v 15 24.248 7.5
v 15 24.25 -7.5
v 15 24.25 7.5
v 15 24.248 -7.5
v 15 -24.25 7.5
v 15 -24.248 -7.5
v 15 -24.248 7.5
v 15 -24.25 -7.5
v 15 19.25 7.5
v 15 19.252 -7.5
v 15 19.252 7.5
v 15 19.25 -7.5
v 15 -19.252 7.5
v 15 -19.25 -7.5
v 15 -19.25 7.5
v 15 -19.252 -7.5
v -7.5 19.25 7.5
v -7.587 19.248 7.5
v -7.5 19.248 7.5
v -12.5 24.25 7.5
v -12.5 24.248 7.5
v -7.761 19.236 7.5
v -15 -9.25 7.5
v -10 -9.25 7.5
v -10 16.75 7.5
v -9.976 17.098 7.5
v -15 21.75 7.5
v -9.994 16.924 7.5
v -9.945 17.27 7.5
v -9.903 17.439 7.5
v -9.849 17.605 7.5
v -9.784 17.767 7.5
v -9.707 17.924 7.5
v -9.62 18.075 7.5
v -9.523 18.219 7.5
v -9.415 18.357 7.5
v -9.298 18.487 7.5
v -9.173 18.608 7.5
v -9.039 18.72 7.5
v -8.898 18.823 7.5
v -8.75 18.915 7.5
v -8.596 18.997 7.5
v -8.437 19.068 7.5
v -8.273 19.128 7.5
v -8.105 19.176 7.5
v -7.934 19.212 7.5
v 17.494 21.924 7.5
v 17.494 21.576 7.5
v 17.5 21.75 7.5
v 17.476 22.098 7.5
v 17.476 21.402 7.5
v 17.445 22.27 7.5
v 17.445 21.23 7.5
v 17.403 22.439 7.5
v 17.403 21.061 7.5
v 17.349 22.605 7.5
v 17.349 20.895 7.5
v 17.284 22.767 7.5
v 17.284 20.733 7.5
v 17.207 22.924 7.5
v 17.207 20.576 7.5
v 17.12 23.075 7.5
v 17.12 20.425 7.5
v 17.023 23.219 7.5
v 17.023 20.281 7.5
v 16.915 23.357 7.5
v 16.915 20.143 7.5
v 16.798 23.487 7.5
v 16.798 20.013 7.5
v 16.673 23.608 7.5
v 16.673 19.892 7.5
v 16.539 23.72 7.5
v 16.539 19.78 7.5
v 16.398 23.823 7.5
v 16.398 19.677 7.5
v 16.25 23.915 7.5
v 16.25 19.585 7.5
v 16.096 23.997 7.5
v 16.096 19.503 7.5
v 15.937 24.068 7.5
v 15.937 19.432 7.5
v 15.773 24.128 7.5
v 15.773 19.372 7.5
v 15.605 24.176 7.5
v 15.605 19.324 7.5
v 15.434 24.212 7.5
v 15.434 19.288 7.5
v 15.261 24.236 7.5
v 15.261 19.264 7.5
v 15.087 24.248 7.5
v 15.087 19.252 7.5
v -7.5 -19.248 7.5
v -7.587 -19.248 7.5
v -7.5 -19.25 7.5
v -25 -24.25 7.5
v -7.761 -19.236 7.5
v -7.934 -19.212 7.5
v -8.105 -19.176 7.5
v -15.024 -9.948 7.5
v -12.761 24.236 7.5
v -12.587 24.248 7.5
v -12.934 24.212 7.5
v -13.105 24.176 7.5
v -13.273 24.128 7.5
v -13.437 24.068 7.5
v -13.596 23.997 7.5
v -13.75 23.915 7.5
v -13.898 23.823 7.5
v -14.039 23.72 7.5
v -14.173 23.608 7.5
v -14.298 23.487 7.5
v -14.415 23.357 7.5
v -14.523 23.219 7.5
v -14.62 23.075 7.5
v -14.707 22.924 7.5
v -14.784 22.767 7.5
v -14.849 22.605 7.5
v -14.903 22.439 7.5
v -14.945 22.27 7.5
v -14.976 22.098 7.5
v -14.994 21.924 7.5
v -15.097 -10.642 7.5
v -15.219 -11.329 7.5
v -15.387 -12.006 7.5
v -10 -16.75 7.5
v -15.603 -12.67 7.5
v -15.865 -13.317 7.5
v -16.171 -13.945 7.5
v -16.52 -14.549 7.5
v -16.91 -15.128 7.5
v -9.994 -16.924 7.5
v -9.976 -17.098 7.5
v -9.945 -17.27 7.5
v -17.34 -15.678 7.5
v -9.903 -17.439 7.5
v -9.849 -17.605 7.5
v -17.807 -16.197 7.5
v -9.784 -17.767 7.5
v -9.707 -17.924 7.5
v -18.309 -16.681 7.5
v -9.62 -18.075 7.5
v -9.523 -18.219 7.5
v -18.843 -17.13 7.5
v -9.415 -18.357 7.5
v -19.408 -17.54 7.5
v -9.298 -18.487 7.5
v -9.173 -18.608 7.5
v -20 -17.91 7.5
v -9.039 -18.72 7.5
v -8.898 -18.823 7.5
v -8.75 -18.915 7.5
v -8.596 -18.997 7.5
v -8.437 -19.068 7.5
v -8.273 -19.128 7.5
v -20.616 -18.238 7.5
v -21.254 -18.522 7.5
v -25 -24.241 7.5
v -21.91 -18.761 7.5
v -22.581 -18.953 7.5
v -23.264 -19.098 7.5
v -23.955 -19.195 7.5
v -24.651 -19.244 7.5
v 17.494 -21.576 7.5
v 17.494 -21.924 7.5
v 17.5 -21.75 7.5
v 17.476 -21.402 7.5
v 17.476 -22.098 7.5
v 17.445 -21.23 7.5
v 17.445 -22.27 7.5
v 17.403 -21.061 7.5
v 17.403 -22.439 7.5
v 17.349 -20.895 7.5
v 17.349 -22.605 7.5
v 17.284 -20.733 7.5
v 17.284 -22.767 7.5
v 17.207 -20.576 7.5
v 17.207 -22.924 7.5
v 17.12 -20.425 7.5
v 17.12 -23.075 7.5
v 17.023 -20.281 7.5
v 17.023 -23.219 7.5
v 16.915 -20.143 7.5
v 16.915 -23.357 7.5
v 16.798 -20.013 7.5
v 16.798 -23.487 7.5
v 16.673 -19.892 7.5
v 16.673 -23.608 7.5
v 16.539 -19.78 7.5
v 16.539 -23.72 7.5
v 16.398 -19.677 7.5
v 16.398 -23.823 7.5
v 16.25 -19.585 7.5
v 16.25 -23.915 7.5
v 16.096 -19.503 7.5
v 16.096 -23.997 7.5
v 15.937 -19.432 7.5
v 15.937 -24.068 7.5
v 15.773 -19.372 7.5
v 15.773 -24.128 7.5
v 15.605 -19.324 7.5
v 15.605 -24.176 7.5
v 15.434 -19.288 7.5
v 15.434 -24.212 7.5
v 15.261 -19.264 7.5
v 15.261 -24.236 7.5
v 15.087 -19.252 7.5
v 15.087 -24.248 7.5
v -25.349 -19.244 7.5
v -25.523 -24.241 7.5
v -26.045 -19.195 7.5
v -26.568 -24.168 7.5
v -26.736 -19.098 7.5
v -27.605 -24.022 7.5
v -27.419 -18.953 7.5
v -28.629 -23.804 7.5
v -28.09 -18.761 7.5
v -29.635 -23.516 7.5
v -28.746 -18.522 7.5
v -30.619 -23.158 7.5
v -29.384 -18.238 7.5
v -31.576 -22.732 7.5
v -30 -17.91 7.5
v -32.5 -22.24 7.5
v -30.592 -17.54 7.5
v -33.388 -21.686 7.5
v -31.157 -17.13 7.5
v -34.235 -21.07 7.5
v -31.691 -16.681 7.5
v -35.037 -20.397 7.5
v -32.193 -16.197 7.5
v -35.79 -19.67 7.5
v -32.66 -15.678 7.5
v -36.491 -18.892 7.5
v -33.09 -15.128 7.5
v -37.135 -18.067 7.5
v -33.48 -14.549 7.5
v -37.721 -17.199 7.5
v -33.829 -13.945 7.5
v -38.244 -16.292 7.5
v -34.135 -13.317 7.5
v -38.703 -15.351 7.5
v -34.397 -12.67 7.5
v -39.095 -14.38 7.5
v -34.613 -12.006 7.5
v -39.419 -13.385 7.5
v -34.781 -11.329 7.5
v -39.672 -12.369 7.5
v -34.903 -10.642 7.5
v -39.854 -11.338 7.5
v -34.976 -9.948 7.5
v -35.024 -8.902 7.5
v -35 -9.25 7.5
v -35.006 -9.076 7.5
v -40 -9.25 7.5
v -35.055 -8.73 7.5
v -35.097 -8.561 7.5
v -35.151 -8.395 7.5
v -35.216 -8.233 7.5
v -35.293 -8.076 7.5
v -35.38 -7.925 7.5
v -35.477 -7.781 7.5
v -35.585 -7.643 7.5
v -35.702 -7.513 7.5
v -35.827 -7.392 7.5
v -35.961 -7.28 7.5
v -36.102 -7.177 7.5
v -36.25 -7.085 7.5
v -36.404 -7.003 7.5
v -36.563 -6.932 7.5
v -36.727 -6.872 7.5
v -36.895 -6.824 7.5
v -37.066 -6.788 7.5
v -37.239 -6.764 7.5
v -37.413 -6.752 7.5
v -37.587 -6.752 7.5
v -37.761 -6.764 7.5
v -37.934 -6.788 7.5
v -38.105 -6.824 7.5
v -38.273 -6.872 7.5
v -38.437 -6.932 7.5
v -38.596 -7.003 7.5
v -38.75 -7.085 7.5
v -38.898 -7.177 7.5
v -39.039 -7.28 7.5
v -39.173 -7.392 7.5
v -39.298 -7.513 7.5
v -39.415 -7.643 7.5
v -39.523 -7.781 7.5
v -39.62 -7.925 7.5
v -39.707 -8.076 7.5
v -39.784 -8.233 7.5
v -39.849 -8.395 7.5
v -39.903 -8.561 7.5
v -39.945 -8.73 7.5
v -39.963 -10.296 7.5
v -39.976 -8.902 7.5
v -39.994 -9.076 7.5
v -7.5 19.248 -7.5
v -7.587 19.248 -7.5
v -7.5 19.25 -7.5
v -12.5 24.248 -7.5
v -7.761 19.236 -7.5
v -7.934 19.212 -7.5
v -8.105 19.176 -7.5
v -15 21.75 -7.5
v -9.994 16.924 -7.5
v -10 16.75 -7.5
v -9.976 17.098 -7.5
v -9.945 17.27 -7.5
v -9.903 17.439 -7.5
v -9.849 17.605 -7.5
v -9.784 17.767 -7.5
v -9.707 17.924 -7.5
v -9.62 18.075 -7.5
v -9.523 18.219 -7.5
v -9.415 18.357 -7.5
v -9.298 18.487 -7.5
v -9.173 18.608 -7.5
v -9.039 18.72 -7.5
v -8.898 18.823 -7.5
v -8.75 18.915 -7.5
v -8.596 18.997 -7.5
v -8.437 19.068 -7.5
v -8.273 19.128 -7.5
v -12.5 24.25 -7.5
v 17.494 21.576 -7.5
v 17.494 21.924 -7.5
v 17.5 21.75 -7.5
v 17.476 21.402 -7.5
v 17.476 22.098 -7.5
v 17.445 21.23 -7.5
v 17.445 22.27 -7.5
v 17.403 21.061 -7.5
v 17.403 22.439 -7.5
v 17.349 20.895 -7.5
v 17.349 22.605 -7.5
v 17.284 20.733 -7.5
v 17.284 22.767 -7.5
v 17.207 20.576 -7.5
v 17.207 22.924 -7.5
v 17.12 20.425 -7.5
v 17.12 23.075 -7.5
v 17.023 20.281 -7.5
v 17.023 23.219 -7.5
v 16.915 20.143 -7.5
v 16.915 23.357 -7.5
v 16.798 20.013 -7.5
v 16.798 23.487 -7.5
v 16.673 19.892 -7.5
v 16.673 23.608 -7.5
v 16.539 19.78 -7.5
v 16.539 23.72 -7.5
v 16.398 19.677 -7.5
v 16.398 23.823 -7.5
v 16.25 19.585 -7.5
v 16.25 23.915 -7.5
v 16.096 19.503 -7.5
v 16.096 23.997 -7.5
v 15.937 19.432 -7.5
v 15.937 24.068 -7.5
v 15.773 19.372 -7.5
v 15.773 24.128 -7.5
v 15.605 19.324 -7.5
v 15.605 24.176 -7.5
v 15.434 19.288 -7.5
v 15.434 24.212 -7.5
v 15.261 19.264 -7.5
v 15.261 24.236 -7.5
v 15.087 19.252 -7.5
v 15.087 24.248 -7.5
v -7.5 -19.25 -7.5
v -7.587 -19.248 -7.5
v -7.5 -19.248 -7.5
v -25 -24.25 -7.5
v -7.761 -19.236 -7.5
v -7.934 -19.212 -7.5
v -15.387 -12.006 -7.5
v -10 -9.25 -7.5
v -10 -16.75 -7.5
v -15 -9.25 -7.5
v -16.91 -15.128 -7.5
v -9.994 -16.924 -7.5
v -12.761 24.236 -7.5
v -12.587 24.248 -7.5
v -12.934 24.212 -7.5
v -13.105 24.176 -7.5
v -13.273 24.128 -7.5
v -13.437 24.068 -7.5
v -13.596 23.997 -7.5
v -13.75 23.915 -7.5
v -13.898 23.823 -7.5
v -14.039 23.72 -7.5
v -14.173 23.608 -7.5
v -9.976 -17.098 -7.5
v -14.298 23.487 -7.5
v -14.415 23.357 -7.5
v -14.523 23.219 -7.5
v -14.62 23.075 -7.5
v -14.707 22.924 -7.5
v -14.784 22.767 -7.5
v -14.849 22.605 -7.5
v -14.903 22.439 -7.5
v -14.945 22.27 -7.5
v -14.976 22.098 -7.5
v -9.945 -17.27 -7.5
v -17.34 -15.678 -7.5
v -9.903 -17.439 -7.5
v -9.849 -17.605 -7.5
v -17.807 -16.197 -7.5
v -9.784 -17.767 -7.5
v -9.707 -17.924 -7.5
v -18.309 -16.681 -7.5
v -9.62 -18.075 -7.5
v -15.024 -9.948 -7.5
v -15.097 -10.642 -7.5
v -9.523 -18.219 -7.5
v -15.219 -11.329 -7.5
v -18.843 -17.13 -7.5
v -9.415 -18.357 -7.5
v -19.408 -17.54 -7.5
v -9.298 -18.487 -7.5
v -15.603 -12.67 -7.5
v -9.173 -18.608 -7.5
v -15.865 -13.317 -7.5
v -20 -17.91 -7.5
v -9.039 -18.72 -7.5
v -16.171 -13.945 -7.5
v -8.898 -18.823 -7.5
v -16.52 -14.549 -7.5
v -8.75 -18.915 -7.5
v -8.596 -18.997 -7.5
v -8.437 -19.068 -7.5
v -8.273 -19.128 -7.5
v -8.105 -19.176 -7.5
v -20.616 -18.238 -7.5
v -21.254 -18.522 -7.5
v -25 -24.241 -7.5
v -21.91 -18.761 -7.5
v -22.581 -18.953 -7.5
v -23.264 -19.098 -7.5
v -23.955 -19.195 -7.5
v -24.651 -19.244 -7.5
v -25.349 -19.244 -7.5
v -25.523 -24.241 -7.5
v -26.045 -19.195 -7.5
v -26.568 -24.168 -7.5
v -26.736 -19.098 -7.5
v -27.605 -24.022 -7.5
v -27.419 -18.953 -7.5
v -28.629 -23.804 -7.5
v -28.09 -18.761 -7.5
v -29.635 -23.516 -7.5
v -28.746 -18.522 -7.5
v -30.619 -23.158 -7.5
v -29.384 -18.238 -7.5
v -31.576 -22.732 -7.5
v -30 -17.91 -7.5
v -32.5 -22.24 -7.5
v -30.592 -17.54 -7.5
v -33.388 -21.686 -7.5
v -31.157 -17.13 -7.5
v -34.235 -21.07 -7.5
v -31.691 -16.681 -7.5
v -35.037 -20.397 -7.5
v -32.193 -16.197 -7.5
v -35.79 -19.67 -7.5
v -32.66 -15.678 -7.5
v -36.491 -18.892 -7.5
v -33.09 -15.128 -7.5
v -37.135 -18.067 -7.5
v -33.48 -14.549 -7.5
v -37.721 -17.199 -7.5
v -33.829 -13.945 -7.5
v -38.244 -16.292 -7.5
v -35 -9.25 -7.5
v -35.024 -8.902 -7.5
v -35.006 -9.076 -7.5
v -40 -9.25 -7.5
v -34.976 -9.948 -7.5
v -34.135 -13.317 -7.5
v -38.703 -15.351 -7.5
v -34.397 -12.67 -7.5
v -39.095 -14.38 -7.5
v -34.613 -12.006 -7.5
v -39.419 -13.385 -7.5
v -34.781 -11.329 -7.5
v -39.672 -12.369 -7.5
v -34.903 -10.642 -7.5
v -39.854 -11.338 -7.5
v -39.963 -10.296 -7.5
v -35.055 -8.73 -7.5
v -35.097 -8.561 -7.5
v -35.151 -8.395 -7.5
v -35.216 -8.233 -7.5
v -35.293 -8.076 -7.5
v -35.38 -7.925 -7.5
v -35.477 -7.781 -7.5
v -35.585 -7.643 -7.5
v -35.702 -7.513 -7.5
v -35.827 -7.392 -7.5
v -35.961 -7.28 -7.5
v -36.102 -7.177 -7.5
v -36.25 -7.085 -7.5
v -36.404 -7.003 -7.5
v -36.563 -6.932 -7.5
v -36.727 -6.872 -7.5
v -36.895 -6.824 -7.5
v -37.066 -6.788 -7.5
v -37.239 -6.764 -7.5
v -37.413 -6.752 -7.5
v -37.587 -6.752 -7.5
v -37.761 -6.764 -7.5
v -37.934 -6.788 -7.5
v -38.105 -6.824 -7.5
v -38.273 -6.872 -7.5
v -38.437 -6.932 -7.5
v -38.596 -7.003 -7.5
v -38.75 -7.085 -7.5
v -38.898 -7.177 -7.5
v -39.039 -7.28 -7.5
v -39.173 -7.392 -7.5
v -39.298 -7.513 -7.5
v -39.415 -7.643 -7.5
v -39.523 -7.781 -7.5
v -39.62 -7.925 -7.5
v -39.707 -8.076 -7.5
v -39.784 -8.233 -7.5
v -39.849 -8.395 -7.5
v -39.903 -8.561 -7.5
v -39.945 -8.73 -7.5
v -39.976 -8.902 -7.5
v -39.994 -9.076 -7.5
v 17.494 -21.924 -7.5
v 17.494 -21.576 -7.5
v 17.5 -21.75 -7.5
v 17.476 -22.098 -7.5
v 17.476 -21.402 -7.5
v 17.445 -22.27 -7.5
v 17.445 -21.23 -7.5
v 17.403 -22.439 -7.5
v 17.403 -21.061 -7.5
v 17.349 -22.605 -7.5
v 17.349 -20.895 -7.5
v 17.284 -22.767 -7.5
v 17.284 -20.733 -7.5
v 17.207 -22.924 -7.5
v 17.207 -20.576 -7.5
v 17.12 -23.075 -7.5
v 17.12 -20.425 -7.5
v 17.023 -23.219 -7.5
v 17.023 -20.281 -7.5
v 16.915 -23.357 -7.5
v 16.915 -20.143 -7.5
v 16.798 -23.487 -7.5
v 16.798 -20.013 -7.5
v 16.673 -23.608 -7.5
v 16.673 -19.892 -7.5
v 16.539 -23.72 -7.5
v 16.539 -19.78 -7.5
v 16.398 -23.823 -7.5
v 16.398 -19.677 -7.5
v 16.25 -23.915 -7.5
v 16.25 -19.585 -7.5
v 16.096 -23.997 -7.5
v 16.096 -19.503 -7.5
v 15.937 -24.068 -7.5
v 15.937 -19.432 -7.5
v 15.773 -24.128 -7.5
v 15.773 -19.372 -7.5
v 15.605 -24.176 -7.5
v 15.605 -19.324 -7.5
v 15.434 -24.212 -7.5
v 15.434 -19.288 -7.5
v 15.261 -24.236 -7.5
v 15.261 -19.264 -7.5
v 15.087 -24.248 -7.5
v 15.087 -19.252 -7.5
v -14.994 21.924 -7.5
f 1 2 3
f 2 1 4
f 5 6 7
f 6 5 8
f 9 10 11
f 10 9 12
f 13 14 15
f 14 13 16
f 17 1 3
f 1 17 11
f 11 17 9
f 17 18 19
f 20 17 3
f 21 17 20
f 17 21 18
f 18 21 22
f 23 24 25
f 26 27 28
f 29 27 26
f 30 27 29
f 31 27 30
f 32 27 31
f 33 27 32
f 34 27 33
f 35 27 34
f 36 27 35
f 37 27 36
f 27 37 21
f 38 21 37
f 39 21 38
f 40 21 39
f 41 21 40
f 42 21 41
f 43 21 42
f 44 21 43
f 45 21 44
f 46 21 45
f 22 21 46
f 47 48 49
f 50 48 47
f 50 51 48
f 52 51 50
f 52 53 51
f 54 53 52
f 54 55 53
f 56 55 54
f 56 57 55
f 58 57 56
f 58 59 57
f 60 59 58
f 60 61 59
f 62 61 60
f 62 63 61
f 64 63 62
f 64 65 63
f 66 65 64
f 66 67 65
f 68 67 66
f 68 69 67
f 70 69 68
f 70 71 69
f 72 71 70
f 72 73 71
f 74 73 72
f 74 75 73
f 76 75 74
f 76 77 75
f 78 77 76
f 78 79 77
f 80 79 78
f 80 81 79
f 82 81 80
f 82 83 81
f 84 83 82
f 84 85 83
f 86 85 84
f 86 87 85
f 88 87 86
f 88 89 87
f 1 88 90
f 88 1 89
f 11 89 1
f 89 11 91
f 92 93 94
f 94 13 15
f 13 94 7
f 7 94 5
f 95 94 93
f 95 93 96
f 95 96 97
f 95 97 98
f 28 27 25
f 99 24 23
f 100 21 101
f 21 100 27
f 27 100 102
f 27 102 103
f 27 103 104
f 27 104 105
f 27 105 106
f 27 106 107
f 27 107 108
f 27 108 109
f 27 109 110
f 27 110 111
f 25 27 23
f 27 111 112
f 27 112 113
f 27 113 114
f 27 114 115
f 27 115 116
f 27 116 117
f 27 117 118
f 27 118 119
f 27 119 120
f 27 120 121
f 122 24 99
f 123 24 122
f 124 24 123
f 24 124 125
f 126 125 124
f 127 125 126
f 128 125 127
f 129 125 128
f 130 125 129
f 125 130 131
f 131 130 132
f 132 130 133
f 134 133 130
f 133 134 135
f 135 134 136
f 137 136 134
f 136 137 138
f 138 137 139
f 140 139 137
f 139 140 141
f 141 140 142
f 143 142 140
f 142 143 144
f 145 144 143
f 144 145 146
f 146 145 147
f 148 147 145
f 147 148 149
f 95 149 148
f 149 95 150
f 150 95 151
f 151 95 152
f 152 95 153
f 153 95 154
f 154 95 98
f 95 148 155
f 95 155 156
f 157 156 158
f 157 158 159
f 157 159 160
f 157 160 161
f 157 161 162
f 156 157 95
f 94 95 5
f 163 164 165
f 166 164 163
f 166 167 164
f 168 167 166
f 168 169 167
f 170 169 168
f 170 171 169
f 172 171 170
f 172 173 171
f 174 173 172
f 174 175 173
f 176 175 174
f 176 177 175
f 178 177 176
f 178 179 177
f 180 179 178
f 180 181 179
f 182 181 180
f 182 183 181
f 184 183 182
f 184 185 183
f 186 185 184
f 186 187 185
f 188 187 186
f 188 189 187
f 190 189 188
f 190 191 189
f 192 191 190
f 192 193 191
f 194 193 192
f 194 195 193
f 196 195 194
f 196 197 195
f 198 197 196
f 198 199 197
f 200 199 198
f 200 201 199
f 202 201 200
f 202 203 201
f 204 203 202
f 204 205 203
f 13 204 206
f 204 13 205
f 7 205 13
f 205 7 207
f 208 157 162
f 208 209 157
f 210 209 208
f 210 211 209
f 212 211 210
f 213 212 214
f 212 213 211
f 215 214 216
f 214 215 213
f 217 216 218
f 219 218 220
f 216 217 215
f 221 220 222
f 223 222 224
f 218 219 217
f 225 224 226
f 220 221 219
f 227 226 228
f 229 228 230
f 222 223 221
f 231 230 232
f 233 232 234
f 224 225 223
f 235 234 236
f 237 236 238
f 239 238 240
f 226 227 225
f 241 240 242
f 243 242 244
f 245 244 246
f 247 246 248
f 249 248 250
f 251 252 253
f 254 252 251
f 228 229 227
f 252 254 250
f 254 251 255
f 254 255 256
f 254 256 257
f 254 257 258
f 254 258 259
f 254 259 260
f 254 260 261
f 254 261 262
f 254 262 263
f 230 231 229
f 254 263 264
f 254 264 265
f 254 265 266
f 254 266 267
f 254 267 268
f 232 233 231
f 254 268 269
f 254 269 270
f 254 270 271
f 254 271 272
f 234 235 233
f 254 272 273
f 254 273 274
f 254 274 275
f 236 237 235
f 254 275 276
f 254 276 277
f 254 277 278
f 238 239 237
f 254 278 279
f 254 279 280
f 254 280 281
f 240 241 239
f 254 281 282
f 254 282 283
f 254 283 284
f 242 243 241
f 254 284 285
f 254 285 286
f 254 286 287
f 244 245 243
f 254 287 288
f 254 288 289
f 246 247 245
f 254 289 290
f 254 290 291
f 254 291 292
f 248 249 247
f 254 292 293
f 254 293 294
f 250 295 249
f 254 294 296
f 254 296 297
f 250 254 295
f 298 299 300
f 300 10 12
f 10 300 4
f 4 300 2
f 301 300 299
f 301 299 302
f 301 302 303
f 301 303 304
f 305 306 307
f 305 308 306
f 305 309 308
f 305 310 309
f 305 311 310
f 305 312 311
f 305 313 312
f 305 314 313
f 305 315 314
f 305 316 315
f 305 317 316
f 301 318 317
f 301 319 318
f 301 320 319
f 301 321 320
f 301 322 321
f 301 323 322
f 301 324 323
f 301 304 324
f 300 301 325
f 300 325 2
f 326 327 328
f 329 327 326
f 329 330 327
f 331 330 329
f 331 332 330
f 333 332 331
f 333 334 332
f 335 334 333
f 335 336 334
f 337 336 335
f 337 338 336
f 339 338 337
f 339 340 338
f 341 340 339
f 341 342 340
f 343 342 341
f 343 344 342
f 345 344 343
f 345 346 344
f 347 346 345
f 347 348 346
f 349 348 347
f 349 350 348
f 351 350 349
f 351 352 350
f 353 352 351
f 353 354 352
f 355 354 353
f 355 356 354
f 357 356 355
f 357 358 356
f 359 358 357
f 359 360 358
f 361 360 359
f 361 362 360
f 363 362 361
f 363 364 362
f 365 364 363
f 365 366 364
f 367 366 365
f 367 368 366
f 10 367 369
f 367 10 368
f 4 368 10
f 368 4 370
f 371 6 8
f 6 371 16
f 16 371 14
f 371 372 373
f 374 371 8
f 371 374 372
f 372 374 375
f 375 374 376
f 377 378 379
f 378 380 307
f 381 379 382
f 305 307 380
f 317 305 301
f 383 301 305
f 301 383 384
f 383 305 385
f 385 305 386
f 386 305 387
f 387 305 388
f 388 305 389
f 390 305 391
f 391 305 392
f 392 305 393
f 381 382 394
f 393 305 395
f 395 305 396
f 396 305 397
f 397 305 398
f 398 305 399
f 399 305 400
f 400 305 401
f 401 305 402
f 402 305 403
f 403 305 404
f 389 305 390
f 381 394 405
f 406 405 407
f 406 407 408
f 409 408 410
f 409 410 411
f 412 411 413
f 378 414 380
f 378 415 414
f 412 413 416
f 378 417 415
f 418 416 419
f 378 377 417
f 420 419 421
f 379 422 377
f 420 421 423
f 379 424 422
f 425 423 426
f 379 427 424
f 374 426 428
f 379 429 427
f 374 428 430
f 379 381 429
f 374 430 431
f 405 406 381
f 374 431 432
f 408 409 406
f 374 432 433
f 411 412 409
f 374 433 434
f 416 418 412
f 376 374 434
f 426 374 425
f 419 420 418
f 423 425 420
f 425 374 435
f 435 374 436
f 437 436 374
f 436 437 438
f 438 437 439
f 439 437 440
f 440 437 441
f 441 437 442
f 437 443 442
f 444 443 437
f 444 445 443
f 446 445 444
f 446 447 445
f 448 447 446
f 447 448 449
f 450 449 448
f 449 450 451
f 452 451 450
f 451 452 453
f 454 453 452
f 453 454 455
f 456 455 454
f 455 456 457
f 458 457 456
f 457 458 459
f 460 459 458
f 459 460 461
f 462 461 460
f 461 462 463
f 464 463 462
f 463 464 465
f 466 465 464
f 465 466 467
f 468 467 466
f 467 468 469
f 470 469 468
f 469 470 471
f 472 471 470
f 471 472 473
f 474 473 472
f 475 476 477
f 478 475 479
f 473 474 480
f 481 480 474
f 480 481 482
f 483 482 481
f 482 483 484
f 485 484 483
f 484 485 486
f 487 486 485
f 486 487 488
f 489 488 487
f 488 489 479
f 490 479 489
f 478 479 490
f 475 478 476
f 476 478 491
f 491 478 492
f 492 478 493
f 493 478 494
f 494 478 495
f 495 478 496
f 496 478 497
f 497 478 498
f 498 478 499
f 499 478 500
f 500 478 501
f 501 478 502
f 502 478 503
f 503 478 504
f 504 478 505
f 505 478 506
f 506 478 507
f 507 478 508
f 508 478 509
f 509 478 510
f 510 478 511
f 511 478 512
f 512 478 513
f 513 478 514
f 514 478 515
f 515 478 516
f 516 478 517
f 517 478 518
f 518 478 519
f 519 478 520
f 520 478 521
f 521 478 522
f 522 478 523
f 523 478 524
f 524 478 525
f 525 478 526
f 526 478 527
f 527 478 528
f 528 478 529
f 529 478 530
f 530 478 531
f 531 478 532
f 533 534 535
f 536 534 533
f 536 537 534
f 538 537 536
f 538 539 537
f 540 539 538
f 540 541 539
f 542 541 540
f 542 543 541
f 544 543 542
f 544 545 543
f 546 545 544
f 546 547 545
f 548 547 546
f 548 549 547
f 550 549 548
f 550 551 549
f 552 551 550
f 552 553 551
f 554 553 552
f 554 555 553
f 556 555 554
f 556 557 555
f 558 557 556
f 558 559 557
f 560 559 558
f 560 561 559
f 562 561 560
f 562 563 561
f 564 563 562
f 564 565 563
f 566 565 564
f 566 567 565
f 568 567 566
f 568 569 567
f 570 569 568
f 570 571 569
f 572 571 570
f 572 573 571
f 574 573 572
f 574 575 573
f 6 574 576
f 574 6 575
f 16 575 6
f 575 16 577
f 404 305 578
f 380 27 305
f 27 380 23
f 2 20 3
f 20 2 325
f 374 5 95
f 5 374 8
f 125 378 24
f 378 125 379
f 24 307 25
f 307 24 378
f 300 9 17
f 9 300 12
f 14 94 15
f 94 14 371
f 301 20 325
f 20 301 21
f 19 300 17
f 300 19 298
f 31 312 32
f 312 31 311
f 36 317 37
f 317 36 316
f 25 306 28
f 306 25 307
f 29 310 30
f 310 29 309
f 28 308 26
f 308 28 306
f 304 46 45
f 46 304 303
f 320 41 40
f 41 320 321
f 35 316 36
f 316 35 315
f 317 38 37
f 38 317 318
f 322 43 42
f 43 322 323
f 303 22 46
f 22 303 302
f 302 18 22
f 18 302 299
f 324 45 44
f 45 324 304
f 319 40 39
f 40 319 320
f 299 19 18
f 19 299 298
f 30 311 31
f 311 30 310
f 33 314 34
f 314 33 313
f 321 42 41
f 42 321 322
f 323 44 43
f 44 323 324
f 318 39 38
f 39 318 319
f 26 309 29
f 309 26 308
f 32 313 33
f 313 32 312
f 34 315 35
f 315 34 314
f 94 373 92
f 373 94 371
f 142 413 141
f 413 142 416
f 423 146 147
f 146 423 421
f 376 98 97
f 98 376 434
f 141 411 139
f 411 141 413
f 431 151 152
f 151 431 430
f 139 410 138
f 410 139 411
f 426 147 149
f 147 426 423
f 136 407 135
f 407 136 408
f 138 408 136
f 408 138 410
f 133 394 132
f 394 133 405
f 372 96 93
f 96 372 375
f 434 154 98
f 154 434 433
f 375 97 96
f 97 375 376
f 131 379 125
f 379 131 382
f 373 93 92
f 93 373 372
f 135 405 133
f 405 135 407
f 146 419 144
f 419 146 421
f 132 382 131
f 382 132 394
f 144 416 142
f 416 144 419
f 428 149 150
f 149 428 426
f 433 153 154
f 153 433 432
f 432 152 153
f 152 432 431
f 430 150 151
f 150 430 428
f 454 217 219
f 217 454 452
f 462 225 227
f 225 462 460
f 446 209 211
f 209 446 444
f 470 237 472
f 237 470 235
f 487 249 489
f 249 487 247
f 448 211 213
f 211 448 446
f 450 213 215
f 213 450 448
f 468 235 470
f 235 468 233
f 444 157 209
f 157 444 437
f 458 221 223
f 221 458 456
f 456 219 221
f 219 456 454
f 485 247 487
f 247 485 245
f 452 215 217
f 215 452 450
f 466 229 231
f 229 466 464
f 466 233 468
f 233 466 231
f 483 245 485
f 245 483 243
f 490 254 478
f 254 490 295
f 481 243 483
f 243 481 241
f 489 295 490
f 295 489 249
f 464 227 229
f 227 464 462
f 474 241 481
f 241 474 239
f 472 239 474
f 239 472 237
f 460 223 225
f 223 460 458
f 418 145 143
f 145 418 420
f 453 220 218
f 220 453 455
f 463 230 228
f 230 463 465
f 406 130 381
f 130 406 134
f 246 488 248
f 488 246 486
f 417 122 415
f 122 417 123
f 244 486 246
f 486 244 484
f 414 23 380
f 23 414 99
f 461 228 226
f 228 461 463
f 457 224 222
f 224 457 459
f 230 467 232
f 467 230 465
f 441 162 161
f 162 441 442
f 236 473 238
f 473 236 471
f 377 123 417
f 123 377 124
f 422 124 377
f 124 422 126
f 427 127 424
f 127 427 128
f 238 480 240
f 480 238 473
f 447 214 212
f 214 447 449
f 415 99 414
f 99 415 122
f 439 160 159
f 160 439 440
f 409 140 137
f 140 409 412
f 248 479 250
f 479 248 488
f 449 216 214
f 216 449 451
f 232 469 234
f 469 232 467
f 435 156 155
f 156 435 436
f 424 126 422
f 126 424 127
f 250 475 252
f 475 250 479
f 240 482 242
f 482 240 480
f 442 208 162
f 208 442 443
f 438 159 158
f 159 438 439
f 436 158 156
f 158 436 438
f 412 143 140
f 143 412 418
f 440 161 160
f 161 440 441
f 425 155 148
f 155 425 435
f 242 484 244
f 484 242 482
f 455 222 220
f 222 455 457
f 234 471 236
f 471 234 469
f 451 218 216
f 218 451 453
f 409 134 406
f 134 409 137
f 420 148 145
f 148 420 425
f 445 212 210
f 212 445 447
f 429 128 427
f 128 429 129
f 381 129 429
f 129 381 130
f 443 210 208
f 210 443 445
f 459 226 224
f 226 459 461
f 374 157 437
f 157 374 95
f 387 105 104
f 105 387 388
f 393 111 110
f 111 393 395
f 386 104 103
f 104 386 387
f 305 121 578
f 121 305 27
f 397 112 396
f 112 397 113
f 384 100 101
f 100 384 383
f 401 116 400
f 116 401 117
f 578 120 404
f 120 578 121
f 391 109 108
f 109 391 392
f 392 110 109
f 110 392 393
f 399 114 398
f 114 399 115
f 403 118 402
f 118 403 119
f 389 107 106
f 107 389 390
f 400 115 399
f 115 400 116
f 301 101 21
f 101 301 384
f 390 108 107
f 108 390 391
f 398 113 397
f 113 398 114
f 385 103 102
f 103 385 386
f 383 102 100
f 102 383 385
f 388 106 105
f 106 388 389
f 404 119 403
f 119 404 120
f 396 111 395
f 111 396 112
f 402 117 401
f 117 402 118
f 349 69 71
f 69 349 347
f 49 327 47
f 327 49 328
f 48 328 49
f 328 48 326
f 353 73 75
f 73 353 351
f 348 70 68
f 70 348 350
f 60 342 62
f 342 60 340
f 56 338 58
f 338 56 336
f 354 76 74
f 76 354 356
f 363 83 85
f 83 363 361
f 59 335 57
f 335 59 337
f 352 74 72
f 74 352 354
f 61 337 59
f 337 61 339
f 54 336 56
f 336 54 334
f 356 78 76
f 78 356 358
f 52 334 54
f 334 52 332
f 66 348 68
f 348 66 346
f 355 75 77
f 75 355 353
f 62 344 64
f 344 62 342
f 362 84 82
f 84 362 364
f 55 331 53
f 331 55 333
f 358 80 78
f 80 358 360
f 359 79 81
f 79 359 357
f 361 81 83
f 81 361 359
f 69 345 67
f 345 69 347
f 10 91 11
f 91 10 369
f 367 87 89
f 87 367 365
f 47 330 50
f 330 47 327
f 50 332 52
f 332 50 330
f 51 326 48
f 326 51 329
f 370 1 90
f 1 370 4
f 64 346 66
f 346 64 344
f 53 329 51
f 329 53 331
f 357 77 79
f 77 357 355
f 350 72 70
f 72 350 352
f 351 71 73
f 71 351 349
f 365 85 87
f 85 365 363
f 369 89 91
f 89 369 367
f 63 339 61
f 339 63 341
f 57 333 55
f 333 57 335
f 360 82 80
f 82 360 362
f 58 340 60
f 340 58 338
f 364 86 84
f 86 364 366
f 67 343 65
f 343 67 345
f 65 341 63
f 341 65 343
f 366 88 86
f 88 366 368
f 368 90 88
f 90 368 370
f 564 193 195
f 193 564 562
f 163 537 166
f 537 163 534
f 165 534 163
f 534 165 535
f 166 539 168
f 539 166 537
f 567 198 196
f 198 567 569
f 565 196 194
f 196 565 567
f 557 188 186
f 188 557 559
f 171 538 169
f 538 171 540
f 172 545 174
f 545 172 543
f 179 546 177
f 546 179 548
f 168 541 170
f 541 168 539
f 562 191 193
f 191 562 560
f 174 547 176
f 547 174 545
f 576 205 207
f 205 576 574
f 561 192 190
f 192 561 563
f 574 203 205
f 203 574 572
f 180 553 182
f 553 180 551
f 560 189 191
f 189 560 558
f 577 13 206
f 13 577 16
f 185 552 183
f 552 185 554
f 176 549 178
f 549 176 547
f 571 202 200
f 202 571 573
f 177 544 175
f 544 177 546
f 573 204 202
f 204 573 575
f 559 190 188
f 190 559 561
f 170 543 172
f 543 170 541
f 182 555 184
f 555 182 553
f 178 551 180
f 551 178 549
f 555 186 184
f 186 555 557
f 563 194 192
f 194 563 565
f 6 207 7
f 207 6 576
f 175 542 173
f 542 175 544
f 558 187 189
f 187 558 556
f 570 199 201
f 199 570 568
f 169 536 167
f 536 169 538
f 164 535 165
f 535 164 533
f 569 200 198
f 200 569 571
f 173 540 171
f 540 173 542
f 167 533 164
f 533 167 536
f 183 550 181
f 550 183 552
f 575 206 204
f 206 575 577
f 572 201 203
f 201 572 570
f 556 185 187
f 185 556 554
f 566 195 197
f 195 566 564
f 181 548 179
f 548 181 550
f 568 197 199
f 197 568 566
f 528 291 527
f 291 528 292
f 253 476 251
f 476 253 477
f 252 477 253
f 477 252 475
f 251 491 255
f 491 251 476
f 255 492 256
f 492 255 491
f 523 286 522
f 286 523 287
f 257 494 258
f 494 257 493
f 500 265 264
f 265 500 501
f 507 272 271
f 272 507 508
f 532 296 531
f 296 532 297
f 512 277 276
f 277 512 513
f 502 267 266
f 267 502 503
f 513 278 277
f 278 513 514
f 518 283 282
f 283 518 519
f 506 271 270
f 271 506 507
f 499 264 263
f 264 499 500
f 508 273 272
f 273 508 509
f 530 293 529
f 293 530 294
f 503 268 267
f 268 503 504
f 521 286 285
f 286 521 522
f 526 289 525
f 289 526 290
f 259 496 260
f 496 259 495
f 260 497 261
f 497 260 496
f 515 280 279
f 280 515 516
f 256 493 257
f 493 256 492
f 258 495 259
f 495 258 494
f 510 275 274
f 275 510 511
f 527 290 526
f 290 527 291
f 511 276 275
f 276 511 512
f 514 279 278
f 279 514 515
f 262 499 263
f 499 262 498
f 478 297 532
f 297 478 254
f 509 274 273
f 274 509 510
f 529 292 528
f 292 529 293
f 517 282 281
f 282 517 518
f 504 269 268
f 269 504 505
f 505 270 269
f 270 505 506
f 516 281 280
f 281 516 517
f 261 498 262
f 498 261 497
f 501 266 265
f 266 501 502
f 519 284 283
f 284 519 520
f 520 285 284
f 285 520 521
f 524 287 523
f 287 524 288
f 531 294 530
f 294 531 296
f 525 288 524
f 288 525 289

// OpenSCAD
$fn=90;

shelfHeight = 38;
mountDepth = 25;
mountWidth = 15;
mountThickness = 5;

mountInnerHeight = shelfHeight + 0.5;
mountOuterHeight = mountInnerHeight + (2 * mountThickness);
mountInnerDepth = mountDepth;
mountOuterDepth = mountInnerDepth + mountThickness;

hookThickness = mountThickness;
hookHeight = 30;
hookInnerDiameter = 20;
hookOuterDiameter = hookInnerDiameter + (mountThickness * 2);



difference() {
    cube([mountOuterDepth, mountOuterHeight, mountWidth], center = true);
    translate([mountThickness / 2, 0, 0]) cube([mountInnerDepth, mountInnerHeight, mountWidth], center = true);
    translate([- (mountOuterDepth - (mountThickness / 2)) / 2, (mountOuterHeight - (mountThickness / 2)) / 2, 0]) cube([mountThickness / 2, mountThickness / 2, mountWidth], center = true);
};

translate([- (mountOuterDepth - mountThickness) / 2, (mountOuterHeight - mountThickness) / 2, 0]) cylinder(d = mountThickness, h = mountWidth, center = true);

translate([- (mountInnerDepth - (mountThickness * 2)) / 2, (mountInnerHeight - mountThickness) / 2, 0])
difference() {
    translate([-mountThickness / 4, mountThickness / 4, 0]) cube([mountThickness / 2, mountThickness / 2, mountWidth], center = true);
    cylinder(d = mountThickness, h = mountWidth, center = true);
};


translate([- (mountInnerDepth - (mountThickness * 2)) / 2, -(mountInnerHeight - mountThickness) / 2, 0])
difference() {
    translate([-mountThickness / 4, -mountThickness / 4, 0]) cube([mountThickness / 2, mountThickness / 2, mountWidth], center = true);
    cylinder(d = mountThickness, h = mountWidth, center = true);
};


translate([-(hookOuterDiameter / 2) - (mountOuterDepth / 2) + mountThickness, - (mountOuterHeight - hookOuterDiameter) / 2, 0])
difference() {
    cylinder(d = hookOuterDiameter, h = mountWidth, center = true);
    cylinder(d = hookInnerDiameter, h = mountWidth, center = true);
    translate([0, hookOuterDiameter / 4, 0]) cube([hookOuterDiameter, hookOuterDiameter / 2, mountWidth], center = true);
};

translate([-((mountOuterDepth + (hookOuterDiameter / 2)) / 2) + mountThickness, -(mountOuterHeight / 2) + (hookOuterDiameter / 4), 0])
difference() {
    cube([hookOuterDiameter / 2, hookOuterDiameter / 2, mountWidth], center = true);
    translate([-hookOuterDiameter / 4, hookOuterDiameter / 4, 0]) cylinder(d = hookInnerDiameter, h = mountWidth, center = true);
};


translate([(mountInnerDepth + mountThickness) / 2, (mountInnerHeight  + mountThickness) / 2, 0])
cylinder(d=mountThickness, h=mountWidth, center = true);

translate([(mountInnerDepth + mountThickness) / 2, - (mountInnerHeight  + mountThickness) / 2, 0])
cylinder(d=mountThickness, h=mountWidth, center = true);

translate([- (mountInnerDepth / 2) - hookInnerDiameter - mountThickness, - (mountOuterHeight - hookOuterDiameter) / 2, 0])
cylinder(d=mountThickness, h=mountWidth, center = true);
